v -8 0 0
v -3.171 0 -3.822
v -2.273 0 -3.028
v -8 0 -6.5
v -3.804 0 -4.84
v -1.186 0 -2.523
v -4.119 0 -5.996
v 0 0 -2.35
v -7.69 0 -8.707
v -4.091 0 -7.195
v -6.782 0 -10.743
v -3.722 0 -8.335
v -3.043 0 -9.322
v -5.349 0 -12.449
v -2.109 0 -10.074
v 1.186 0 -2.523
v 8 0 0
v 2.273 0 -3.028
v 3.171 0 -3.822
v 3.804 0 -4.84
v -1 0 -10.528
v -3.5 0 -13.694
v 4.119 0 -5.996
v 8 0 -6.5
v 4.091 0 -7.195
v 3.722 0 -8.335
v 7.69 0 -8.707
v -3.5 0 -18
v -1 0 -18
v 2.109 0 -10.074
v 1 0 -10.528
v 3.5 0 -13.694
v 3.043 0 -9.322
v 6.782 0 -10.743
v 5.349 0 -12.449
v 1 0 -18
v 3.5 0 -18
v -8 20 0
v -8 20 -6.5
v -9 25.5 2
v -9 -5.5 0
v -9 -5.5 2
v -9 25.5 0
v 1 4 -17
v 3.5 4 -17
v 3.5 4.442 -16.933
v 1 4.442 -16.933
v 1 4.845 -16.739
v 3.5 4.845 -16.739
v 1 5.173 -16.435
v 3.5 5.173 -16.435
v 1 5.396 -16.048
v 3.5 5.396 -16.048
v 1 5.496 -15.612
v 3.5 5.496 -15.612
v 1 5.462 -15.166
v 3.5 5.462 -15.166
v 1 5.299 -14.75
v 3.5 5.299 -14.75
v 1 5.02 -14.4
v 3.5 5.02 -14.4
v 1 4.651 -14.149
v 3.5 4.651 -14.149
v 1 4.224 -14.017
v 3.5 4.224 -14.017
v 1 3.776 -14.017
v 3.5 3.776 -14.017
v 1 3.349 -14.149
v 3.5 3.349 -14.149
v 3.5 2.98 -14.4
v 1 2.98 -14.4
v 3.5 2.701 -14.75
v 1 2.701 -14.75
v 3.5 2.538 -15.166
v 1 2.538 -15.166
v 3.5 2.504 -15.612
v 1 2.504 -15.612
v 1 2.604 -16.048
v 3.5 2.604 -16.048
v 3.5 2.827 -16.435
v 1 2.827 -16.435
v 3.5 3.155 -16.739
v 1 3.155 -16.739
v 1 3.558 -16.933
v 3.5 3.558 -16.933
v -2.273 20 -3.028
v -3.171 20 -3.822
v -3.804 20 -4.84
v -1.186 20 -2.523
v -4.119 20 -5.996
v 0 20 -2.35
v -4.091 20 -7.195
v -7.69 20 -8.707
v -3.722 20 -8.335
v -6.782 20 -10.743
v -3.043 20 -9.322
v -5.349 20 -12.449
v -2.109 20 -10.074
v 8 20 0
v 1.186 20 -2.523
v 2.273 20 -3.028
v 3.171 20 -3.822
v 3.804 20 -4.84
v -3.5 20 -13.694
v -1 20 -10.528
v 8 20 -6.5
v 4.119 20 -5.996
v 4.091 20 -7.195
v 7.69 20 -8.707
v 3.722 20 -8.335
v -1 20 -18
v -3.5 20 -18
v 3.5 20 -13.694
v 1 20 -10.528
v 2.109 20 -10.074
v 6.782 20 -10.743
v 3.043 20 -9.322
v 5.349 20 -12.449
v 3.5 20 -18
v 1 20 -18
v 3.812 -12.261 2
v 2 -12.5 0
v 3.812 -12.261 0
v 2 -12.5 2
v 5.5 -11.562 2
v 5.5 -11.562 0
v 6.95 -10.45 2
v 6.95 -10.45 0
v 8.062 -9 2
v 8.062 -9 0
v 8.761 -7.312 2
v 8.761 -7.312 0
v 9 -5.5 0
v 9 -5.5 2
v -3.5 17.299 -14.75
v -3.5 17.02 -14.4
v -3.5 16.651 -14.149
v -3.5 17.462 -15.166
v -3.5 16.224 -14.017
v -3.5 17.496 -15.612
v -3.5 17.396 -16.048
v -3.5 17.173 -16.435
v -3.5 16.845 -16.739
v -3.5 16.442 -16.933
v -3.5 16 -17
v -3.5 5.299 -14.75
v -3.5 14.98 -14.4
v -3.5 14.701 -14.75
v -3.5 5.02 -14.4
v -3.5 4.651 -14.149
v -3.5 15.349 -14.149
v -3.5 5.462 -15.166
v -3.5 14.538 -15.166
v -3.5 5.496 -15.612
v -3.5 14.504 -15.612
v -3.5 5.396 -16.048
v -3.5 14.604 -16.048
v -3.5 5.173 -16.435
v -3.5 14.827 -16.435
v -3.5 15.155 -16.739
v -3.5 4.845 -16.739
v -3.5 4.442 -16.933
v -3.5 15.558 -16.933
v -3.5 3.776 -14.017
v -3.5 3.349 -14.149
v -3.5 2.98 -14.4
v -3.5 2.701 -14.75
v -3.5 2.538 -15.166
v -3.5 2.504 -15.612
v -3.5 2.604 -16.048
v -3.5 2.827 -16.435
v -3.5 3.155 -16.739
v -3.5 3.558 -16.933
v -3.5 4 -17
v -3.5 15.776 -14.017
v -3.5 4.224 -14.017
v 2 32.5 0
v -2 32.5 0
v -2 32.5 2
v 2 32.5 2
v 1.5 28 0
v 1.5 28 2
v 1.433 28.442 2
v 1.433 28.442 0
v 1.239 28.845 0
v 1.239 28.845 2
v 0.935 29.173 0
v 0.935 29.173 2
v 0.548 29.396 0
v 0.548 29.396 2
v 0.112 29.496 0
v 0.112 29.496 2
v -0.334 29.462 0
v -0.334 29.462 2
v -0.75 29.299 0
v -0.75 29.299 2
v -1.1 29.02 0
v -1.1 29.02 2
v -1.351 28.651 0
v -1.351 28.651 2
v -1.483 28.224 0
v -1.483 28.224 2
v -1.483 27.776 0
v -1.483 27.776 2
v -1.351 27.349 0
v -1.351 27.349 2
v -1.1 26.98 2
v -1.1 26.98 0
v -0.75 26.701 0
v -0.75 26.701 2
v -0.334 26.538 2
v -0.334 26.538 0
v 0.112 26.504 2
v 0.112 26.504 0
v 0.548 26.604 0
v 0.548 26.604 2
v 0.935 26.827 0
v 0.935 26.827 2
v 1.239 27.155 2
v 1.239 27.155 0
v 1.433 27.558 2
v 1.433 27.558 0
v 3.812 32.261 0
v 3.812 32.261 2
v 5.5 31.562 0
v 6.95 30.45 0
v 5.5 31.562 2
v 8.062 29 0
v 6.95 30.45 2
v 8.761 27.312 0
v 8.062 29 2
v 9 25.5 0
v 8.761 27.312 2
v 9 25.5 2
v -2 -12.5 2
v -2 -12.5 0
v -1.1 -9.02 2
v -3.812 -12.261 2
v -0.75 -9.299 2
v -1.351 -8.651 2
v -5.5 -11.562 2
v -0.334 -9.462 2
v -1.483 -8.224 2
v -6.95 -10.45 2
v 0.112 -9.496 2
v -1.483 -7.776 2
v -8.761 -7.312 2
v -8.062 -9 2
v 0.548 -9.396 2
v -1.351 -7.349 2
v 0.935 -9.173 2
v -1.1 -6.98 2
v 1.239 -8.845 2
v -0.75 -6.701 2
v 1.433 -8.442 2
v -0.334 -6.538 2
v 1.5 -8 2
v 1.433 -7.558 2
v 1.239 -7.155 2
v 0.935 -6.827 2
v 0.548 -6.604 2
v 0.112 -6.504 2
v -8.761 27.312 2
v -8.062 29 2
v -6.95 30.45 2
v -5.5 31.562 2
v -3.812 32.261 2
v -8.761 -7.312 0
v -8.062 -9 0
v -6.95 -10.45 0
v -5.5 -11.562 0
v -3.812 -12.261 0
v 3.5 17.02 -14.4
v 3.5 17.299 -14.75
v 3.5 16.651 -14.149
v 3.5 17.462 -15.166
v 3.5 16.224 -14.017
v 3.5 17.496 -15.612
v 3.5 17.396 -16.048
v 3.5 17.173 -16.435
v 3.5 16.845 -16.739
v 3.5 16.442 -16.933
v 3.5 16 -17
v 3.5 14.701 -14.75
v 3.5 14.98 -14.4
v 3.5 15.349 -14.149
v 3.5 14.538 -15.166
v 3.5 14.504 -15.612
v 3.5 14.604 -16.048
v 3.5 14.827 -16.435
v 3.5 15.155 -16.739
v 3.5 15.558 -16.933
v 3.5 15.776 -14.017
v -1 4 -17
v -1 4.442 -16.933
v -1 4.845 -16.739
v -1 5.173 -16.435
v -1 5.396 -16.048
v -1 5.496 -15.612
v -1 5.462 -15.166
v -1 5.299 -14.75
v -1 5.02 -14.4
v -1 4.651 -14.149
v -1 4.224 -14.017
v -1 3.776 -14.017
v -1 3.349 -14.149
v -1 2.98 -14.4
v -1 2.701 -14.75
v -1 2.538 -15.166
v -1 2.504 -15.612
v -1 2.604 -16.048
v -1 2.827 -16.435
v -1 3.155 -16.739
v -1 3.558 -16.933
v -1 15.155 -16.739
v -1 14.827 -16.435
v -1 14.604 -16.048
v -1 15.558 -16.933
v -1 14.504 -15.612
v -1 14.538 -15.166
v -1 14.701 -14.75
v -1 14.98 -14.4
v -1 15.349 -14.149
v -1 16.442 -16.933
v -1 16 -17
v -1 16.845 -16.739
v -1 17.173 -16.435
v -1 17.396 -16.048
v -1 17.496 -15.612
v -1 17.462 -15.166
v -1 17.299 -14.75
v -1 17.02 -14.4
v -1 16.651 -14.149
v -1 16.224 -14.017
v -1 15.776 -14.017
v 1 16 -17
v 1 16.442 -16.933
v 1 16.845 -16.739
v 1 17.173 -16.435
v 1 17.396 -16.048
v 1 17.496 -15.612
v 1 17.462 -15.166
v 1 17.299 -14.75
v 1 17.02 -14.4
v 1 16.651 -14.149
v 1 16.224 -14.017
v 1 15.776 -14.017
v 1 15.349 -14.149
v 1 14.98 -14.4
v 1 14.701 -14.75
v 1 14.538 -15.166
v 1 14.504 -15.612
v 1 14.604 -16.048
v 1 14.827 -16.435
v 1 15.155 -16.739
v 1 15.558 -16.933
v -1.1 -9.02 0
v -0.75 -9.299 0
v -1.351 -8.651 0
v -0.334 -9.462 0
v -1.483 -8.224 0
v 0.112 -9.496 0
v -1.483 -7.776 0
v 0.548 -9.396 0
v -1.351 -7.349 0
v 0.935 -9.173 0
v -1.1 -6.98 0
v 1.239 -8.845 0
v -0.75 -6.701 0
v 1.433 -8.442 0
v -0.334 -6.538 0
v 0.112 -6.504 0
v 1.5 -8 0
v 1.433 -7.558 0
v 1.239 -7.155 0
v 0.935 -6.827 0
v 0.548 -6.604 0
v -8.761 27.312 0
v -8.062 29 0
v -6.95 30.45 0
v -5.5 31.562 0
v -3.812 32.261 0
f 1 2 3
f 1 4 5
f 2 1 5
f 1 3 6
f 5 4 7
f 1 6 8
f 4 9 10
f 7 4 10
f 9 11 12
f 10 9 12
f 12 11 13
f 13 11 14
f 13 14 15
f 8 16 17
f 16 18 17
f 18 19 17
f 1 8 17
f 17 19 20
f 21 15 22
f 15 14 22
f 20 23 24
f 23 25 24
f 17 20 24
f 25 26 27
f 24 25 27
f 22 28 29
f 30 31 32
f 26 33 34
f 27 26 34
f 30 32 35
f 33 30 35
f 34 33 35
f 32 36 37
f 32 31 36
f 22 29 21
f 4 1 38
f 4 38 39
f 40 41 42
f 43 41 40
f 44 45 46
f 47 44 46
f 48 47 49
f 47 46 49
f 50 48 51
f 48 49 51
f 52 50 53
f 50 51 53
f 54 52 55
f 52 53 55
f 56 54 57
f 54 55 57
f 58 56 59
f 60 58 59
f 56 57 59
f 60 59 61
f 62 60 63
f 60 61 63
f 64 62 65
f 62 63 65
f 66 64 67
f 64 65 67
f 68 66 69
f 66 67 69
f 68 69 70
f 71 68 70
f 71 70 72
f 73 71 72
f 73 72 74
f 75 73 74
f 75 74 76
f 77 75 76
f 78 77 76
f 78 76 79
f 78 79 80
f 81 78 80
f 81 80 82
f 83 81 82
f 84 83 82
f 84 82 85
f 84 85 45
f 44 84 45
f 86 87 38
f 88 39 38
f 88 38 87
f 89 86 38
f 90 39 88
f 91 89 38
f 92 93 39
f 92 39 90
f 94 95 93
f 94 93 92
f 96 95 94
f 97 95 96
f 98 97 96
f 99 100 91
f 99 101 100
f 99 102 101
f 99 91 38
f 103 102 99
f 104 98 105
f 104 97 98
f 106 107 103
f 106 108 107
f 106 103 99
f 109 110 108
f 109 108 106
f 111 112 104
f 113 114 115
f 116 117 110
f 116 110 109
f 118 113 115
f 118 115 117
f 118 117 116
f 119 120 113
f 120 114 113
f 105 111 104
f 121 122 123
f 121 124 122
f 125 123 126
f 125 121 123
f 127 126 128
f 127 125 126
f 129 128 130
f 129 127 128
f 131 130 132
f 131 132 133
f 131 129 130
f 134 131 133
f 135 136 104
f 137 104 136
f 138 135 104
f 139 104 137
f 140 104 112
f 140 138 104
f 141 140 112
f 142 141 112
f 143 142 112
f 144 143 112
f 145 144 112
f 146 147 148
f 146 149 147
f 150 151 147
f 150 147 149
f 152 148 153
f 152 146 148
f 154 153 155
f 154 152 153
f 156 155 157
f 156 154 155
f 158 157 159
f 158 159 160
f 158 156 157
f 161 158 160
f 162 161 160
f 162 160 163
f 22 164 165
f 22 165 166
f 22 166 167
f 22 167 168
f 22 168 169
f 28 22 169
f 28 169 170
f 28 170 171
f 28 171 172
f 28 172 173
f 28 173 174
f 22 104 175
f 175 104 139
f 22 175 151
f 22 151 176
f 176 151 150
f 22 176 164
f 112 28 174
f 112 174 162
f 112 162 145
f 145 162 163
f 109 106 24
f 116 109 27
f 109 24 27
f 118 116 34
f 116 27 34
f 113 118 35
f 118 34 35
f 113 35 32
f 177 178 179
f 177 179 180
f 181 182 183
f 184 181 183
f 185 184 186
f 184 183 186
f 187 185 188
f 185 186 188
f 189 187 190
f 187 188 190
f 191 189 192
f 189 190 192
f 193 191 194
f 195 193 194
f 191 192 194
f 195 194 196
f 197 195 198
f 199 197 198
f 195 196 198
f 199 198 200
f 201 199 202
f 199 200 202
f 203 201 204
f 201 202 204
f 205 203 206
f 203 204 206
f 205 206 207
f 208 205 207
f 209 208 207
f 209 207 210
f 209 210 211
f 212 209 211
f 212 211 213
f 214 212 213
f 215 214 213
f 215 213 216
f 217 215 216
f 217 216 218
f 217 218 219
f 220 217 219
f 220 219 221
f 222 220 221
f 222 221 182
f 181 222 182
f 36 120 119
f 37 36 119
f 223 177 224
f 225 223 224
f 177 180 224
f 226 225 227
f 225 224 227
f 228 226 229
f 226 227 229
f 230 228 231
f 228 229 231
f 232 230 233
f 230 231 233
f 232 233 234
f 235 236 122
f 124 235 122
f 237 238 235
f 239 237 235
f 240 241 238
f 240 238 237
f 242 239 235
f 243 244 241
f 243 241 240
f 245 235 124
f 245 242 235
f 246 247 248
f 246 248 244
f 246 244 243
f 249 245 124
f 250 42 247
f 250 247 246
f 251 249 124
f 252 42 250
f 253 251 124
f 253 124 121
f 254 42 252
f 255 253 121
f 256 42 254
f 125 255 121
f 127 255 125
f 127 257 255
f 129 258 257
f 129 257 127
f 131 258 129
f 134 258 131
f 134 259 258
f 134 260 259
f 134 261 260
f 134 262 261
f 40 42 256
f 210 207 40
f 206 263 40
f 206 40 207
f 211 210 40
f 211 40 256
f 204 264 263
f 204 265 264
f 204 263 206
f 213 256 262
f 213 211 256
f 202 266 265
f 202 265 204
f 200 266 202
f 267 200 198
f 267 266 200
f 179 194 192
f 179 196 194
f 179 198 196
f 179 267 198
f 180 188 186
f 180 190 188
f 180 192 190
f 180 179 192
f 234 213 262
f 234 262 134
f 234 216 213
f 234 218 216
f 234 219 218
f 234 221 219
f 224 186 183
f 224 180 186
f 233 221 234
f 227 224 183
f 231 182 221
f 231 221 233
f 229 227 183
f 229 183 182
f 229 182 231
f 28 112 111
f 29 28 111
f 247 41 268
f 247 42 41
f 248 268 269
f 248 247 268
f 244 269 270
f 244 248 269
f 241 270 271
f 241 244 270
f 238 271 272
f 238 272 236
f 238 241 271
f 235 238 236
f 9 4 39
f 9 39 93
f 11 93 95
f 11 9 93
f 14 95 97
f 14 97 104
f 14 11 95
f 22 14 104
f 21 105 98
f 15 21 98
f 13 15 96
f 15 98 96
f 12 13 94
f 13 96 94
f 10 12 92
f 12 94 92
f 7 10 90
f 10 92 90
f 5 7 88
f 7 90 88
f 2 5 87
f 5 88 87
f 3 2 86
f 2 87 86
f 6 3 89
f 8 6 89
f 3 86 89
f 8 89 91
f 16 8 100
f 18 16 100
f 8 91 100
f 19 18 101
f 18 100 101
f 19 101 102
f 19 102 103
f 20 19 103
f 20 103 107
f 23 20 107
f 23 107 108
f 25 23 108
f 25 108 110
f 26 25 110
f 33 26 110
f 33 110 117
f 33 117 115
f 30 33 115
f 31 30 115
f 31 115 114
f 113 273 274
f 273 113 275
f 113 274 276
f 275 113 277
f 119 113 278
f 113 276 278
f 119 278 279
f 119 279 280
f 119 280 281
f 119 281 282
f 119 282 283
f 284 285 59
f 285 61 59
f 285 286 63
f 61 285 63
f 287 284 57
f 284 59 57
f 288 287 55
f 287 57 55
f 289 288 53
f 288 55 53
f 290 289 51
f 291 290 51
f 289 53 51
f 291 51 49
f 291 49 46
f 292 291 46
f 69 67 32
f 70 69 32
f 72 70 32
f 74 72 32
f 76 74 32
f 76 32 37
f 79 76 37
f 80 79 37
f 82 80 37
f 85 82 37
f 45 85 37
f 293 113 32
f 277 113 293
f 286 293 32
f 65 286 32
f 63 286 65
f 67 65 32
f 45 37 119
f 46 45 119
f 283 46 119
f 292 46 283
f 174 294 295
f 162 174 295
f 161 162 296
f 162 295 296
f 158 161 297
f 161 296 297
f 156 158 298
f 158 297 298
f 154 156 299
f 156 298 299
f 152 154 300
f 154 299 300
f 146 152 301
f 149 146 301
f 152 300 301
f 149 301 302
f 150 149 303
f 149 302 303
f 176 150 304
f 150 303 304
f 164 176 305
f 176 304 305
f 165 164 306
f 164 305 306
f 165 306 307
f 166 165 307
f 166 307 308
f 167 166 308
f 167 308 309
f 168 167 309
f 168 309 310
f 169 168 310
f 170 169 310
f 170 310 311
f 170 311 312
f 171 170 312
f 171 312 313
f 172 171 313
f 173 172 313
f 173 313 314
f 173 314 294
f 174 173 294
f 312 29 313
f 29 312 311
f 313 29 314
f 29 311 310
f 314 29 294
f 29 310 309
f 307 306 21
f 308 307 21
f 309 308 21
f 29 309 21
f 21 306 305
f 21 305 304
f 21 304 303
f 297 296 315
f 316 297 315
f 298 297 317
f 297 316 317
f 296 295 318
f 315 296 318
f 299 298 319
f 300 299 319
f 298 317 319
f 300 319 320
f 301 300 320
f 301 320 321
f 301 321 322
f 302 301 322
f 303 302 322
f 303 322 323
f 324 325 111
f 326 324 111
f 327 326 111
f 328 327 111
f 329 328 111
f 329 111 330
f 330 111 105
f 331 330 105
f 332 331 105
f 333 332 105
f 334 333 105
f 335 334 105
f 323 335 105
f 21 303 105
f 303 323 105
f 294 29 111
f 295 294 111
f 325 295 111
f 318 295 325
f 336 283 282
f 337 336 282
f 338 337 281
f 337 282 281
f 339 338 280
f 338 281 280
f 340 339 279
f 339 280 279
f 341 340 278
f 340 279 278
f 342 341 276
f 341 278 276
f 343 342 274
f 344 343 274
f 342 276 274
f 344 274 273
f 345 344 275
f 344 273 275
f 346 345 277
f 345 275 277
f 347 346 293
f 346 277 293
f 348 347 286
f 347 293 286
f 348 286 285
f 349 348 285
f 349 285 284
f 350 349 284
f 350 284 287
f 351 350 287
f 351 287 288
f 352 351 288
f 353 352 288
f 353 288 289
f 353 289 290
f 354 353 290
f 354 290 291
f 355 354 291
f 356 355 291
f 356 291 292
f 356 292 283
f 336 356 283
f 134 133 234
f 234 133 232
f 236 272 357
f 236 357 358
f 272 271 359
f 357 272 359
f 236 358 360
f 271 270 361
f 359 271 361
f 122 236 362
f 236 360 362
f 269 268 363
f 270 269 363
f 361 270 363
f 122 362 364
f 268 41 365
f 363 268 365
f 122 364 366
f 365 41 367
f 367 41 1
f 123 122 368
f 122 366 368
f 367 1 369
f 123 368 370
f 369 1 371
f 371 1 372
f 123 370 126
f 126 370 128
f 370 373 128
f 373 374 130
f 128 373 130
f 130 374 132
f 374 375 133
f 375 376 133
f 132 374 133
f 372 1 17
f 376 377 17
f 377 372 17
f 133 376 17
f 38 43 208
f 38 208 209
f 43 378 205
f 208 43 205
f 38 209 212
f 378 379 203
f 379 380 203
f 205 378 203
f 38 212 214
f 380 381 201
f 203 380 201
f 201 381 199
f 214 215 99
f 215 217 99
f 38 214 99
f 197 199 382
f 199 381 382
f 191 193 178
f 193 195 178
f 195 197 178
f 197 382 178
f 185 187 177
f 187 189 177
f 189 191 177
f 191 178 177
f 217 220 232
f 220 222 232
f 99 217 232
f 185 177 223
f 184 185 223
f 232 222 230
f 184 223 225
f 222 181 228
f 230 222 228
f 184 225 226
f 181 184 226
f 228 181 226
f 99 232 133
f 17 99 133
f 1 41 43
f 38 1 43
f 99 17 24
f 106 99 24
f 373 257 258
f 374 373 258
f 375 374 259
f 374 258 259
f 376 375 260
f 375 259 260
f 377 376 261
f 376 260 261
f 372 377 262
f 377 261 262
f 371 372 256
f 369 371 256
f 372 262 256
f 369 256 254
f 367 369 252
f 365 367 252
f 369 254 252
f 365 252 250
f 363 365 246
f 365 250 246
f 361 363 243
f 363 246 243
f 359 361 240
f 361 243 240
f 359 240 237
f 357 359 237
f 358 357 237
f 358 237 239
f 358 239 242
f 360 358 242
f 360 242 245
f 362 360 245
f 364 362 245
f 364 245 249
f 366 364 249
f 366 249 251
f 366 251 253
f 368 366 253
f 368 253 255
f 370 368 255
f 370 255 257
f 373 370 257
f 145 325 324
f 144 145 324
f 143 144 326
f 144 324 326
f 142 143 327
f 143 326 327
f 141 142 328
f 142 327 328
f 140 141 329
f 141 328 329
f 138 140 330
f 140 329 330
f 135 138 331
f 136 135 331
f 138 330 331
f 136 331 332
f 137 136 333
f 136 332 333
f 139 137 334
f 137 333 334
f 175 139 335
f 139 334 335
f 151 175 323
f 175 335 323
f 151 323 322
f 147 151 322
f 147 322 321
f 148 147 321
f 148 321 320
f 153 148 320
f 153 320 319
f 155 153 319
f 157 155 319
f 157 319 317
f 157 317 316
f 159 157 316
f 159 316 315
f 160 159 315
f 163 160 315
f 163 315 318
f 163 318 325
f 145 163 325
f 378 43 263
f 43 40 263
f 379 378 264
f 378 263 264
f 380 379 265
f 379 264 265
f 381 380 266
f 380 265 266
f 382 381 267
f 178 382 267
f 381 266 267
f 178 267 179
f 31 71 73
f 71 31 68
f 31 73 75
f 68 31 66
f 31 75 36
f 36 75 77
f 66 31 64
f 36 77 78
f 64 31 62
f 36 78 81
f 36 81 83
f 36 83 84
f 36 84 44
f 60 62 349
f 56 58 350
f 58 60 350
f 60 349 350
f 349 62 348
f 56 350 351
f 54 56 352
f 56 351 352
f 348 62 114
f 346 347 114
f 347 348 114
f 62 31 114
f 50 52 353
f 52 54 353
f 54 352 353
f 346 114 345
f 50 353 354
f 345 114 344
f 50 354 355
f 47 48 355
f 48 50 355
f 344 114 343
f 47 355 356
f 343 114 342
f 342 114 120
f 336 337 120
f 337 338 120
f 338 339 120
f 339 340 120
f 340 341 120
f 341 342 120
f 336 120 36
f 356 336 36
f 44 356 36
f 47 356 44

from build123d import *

# Parameters (mm, degrees)
SKETCH1_W           = 18
SKETCH1_H           = 18
BOSS_EXTRUDE1_DEPTH = 20
SKETCH2_R           = 4.15
CUT_EXTRUDE1_DEPTH  = 21
SKETCH3_R           = 1.5
CUT_EXTRUDE2_DEPTH  = 19
SKETCH4_W           = 18
SKETCH4_H           = 45
BOSS_EXTRUDE2_DEPTH = 2
SKETCH5_R           = 1.5
CUT_EXTRUDE3_DEPTH  = 21
FILLET1_R           = 7
CUT_EXTRUDE4_DEPTH  = 33.5


with BuildPart() as part:
    # Sketch1 → Boss-Extrude1 (new body)
    with BuildSketch(Plane(origin=(0, 0, 0), x_dir=(1, 0, 0), z_dir=(0, 1, 0))):
        with Locations((0, 9)):
            Rectangle(SKETCH1_W, SKETCH1_H)
    extrude(amount=BOSS_EXTRUDE1_DEPTH)

    # Sketch2 → Cut-Extrude1 (cut, through all)
    with BuildSketch(Plane(origin=(0, 20, 0), x_dir=(1, 0, 0), z_dir=(0, 1, 0))):
        with Locations((0, 6.5)):
            Circle(SKETCH2_R)
        with BuildLine():
            Line((1, 10.527716475), (1, 18))
            Line((1, 18), (0, 18))
            Line((0, 18), (-1, 18))
            Line((-1, 18), (-1, 10.527716475))
            ThreePointArc((-1, 10.527716475), (0, 2.35), (1, 10.527716475))
        make_face()
    extrude(amount=-CUT_EXTRUDE1_DEPTH, mode=Mode.SUBTRACT)

    # Sketch3 → Cut-Extrude2 (cut, through all)
    with BuildSketch(Plane(origin=(9, 0, 0), x_dir=(0, 0, -1), z_dir=(1, 0, 0))):
        with Locations((15.5, 16)):
            Circle(SKETCH3_R)
        with Locations((15.5, 4)):
            Circle(SKETCH3_R)
    extrude(amount=-CUT_EXTRUDE2_DEPTH, mode=Mode.SUBTRACT)

    # Sketch4 → Boss-Extrude2 (add)
    with BuildSketch(Plane.XY):
        with Locations((0, 10)):
            Rectangle(SKETCH4_W, SKETCH4_H)
    extrude(amount=BOSS_EXTRUDE2_DEPTH)

    # Sketch5 → Cut-Extrude3 (cut, through all)
    with BuildSketch(Plane.XY.offset(2)):
        with Locations((0, 28)):
            Circle(SKETCH5_R)
        with Locations((0, -8)):
            Circle(SKETCH5_R)
    extrude(amount=-CUT_EXTRUDE3_DEPTH, mode=Mode.SUBTRACT)

    # Fillet1
    fillet1_edges = [part.edges().sort_by_distance(p)[0] for p in [
        (9, -12.5, 1),
        (9, 32.5, 1),
        (-9, 32.5, 1),
        (-9, -12.5, 1),
    ]]
    fillet(fillet1_edges, radius=FILLET1_R)

    # Sketch6 → Cut-Extrude4 (cut, through all)
    with BuildSketch(Plane.XZ):
        with BuildLine():
            Line((-3.5, -13.693747285), (-3.5, -18))
            Line((-3.5, -18), (-9, -18))
            Line((-9, -18), (-9, 0))
            Line((-9, 0), (-8, 0))
            Line((-8, 0), (-8, -6.5))
            ThreePointArc((-8, -6.5), (-6.782329983, -10.742640687), (-3.5, -13.693747285))
        make_face()
        with BuildLine():
            Line((8, 0), (8, -6.5))
            ThreePointArc((8, -6.5), (6.782329983, -10.742640687), (3.5, -13.693747285))
            Line((3.5, -13.693747285), (3.5, -18))
            Line((3.5, -18), (9, -18))
            Line((9, -18), (9, 0))
            Line((9, 0), (8, 0))
        make_face()
    extrude(amount=-CUT_EXTRUDE4_DEPTH, mode=Mode.SUBTRACT)


solid = part.part
